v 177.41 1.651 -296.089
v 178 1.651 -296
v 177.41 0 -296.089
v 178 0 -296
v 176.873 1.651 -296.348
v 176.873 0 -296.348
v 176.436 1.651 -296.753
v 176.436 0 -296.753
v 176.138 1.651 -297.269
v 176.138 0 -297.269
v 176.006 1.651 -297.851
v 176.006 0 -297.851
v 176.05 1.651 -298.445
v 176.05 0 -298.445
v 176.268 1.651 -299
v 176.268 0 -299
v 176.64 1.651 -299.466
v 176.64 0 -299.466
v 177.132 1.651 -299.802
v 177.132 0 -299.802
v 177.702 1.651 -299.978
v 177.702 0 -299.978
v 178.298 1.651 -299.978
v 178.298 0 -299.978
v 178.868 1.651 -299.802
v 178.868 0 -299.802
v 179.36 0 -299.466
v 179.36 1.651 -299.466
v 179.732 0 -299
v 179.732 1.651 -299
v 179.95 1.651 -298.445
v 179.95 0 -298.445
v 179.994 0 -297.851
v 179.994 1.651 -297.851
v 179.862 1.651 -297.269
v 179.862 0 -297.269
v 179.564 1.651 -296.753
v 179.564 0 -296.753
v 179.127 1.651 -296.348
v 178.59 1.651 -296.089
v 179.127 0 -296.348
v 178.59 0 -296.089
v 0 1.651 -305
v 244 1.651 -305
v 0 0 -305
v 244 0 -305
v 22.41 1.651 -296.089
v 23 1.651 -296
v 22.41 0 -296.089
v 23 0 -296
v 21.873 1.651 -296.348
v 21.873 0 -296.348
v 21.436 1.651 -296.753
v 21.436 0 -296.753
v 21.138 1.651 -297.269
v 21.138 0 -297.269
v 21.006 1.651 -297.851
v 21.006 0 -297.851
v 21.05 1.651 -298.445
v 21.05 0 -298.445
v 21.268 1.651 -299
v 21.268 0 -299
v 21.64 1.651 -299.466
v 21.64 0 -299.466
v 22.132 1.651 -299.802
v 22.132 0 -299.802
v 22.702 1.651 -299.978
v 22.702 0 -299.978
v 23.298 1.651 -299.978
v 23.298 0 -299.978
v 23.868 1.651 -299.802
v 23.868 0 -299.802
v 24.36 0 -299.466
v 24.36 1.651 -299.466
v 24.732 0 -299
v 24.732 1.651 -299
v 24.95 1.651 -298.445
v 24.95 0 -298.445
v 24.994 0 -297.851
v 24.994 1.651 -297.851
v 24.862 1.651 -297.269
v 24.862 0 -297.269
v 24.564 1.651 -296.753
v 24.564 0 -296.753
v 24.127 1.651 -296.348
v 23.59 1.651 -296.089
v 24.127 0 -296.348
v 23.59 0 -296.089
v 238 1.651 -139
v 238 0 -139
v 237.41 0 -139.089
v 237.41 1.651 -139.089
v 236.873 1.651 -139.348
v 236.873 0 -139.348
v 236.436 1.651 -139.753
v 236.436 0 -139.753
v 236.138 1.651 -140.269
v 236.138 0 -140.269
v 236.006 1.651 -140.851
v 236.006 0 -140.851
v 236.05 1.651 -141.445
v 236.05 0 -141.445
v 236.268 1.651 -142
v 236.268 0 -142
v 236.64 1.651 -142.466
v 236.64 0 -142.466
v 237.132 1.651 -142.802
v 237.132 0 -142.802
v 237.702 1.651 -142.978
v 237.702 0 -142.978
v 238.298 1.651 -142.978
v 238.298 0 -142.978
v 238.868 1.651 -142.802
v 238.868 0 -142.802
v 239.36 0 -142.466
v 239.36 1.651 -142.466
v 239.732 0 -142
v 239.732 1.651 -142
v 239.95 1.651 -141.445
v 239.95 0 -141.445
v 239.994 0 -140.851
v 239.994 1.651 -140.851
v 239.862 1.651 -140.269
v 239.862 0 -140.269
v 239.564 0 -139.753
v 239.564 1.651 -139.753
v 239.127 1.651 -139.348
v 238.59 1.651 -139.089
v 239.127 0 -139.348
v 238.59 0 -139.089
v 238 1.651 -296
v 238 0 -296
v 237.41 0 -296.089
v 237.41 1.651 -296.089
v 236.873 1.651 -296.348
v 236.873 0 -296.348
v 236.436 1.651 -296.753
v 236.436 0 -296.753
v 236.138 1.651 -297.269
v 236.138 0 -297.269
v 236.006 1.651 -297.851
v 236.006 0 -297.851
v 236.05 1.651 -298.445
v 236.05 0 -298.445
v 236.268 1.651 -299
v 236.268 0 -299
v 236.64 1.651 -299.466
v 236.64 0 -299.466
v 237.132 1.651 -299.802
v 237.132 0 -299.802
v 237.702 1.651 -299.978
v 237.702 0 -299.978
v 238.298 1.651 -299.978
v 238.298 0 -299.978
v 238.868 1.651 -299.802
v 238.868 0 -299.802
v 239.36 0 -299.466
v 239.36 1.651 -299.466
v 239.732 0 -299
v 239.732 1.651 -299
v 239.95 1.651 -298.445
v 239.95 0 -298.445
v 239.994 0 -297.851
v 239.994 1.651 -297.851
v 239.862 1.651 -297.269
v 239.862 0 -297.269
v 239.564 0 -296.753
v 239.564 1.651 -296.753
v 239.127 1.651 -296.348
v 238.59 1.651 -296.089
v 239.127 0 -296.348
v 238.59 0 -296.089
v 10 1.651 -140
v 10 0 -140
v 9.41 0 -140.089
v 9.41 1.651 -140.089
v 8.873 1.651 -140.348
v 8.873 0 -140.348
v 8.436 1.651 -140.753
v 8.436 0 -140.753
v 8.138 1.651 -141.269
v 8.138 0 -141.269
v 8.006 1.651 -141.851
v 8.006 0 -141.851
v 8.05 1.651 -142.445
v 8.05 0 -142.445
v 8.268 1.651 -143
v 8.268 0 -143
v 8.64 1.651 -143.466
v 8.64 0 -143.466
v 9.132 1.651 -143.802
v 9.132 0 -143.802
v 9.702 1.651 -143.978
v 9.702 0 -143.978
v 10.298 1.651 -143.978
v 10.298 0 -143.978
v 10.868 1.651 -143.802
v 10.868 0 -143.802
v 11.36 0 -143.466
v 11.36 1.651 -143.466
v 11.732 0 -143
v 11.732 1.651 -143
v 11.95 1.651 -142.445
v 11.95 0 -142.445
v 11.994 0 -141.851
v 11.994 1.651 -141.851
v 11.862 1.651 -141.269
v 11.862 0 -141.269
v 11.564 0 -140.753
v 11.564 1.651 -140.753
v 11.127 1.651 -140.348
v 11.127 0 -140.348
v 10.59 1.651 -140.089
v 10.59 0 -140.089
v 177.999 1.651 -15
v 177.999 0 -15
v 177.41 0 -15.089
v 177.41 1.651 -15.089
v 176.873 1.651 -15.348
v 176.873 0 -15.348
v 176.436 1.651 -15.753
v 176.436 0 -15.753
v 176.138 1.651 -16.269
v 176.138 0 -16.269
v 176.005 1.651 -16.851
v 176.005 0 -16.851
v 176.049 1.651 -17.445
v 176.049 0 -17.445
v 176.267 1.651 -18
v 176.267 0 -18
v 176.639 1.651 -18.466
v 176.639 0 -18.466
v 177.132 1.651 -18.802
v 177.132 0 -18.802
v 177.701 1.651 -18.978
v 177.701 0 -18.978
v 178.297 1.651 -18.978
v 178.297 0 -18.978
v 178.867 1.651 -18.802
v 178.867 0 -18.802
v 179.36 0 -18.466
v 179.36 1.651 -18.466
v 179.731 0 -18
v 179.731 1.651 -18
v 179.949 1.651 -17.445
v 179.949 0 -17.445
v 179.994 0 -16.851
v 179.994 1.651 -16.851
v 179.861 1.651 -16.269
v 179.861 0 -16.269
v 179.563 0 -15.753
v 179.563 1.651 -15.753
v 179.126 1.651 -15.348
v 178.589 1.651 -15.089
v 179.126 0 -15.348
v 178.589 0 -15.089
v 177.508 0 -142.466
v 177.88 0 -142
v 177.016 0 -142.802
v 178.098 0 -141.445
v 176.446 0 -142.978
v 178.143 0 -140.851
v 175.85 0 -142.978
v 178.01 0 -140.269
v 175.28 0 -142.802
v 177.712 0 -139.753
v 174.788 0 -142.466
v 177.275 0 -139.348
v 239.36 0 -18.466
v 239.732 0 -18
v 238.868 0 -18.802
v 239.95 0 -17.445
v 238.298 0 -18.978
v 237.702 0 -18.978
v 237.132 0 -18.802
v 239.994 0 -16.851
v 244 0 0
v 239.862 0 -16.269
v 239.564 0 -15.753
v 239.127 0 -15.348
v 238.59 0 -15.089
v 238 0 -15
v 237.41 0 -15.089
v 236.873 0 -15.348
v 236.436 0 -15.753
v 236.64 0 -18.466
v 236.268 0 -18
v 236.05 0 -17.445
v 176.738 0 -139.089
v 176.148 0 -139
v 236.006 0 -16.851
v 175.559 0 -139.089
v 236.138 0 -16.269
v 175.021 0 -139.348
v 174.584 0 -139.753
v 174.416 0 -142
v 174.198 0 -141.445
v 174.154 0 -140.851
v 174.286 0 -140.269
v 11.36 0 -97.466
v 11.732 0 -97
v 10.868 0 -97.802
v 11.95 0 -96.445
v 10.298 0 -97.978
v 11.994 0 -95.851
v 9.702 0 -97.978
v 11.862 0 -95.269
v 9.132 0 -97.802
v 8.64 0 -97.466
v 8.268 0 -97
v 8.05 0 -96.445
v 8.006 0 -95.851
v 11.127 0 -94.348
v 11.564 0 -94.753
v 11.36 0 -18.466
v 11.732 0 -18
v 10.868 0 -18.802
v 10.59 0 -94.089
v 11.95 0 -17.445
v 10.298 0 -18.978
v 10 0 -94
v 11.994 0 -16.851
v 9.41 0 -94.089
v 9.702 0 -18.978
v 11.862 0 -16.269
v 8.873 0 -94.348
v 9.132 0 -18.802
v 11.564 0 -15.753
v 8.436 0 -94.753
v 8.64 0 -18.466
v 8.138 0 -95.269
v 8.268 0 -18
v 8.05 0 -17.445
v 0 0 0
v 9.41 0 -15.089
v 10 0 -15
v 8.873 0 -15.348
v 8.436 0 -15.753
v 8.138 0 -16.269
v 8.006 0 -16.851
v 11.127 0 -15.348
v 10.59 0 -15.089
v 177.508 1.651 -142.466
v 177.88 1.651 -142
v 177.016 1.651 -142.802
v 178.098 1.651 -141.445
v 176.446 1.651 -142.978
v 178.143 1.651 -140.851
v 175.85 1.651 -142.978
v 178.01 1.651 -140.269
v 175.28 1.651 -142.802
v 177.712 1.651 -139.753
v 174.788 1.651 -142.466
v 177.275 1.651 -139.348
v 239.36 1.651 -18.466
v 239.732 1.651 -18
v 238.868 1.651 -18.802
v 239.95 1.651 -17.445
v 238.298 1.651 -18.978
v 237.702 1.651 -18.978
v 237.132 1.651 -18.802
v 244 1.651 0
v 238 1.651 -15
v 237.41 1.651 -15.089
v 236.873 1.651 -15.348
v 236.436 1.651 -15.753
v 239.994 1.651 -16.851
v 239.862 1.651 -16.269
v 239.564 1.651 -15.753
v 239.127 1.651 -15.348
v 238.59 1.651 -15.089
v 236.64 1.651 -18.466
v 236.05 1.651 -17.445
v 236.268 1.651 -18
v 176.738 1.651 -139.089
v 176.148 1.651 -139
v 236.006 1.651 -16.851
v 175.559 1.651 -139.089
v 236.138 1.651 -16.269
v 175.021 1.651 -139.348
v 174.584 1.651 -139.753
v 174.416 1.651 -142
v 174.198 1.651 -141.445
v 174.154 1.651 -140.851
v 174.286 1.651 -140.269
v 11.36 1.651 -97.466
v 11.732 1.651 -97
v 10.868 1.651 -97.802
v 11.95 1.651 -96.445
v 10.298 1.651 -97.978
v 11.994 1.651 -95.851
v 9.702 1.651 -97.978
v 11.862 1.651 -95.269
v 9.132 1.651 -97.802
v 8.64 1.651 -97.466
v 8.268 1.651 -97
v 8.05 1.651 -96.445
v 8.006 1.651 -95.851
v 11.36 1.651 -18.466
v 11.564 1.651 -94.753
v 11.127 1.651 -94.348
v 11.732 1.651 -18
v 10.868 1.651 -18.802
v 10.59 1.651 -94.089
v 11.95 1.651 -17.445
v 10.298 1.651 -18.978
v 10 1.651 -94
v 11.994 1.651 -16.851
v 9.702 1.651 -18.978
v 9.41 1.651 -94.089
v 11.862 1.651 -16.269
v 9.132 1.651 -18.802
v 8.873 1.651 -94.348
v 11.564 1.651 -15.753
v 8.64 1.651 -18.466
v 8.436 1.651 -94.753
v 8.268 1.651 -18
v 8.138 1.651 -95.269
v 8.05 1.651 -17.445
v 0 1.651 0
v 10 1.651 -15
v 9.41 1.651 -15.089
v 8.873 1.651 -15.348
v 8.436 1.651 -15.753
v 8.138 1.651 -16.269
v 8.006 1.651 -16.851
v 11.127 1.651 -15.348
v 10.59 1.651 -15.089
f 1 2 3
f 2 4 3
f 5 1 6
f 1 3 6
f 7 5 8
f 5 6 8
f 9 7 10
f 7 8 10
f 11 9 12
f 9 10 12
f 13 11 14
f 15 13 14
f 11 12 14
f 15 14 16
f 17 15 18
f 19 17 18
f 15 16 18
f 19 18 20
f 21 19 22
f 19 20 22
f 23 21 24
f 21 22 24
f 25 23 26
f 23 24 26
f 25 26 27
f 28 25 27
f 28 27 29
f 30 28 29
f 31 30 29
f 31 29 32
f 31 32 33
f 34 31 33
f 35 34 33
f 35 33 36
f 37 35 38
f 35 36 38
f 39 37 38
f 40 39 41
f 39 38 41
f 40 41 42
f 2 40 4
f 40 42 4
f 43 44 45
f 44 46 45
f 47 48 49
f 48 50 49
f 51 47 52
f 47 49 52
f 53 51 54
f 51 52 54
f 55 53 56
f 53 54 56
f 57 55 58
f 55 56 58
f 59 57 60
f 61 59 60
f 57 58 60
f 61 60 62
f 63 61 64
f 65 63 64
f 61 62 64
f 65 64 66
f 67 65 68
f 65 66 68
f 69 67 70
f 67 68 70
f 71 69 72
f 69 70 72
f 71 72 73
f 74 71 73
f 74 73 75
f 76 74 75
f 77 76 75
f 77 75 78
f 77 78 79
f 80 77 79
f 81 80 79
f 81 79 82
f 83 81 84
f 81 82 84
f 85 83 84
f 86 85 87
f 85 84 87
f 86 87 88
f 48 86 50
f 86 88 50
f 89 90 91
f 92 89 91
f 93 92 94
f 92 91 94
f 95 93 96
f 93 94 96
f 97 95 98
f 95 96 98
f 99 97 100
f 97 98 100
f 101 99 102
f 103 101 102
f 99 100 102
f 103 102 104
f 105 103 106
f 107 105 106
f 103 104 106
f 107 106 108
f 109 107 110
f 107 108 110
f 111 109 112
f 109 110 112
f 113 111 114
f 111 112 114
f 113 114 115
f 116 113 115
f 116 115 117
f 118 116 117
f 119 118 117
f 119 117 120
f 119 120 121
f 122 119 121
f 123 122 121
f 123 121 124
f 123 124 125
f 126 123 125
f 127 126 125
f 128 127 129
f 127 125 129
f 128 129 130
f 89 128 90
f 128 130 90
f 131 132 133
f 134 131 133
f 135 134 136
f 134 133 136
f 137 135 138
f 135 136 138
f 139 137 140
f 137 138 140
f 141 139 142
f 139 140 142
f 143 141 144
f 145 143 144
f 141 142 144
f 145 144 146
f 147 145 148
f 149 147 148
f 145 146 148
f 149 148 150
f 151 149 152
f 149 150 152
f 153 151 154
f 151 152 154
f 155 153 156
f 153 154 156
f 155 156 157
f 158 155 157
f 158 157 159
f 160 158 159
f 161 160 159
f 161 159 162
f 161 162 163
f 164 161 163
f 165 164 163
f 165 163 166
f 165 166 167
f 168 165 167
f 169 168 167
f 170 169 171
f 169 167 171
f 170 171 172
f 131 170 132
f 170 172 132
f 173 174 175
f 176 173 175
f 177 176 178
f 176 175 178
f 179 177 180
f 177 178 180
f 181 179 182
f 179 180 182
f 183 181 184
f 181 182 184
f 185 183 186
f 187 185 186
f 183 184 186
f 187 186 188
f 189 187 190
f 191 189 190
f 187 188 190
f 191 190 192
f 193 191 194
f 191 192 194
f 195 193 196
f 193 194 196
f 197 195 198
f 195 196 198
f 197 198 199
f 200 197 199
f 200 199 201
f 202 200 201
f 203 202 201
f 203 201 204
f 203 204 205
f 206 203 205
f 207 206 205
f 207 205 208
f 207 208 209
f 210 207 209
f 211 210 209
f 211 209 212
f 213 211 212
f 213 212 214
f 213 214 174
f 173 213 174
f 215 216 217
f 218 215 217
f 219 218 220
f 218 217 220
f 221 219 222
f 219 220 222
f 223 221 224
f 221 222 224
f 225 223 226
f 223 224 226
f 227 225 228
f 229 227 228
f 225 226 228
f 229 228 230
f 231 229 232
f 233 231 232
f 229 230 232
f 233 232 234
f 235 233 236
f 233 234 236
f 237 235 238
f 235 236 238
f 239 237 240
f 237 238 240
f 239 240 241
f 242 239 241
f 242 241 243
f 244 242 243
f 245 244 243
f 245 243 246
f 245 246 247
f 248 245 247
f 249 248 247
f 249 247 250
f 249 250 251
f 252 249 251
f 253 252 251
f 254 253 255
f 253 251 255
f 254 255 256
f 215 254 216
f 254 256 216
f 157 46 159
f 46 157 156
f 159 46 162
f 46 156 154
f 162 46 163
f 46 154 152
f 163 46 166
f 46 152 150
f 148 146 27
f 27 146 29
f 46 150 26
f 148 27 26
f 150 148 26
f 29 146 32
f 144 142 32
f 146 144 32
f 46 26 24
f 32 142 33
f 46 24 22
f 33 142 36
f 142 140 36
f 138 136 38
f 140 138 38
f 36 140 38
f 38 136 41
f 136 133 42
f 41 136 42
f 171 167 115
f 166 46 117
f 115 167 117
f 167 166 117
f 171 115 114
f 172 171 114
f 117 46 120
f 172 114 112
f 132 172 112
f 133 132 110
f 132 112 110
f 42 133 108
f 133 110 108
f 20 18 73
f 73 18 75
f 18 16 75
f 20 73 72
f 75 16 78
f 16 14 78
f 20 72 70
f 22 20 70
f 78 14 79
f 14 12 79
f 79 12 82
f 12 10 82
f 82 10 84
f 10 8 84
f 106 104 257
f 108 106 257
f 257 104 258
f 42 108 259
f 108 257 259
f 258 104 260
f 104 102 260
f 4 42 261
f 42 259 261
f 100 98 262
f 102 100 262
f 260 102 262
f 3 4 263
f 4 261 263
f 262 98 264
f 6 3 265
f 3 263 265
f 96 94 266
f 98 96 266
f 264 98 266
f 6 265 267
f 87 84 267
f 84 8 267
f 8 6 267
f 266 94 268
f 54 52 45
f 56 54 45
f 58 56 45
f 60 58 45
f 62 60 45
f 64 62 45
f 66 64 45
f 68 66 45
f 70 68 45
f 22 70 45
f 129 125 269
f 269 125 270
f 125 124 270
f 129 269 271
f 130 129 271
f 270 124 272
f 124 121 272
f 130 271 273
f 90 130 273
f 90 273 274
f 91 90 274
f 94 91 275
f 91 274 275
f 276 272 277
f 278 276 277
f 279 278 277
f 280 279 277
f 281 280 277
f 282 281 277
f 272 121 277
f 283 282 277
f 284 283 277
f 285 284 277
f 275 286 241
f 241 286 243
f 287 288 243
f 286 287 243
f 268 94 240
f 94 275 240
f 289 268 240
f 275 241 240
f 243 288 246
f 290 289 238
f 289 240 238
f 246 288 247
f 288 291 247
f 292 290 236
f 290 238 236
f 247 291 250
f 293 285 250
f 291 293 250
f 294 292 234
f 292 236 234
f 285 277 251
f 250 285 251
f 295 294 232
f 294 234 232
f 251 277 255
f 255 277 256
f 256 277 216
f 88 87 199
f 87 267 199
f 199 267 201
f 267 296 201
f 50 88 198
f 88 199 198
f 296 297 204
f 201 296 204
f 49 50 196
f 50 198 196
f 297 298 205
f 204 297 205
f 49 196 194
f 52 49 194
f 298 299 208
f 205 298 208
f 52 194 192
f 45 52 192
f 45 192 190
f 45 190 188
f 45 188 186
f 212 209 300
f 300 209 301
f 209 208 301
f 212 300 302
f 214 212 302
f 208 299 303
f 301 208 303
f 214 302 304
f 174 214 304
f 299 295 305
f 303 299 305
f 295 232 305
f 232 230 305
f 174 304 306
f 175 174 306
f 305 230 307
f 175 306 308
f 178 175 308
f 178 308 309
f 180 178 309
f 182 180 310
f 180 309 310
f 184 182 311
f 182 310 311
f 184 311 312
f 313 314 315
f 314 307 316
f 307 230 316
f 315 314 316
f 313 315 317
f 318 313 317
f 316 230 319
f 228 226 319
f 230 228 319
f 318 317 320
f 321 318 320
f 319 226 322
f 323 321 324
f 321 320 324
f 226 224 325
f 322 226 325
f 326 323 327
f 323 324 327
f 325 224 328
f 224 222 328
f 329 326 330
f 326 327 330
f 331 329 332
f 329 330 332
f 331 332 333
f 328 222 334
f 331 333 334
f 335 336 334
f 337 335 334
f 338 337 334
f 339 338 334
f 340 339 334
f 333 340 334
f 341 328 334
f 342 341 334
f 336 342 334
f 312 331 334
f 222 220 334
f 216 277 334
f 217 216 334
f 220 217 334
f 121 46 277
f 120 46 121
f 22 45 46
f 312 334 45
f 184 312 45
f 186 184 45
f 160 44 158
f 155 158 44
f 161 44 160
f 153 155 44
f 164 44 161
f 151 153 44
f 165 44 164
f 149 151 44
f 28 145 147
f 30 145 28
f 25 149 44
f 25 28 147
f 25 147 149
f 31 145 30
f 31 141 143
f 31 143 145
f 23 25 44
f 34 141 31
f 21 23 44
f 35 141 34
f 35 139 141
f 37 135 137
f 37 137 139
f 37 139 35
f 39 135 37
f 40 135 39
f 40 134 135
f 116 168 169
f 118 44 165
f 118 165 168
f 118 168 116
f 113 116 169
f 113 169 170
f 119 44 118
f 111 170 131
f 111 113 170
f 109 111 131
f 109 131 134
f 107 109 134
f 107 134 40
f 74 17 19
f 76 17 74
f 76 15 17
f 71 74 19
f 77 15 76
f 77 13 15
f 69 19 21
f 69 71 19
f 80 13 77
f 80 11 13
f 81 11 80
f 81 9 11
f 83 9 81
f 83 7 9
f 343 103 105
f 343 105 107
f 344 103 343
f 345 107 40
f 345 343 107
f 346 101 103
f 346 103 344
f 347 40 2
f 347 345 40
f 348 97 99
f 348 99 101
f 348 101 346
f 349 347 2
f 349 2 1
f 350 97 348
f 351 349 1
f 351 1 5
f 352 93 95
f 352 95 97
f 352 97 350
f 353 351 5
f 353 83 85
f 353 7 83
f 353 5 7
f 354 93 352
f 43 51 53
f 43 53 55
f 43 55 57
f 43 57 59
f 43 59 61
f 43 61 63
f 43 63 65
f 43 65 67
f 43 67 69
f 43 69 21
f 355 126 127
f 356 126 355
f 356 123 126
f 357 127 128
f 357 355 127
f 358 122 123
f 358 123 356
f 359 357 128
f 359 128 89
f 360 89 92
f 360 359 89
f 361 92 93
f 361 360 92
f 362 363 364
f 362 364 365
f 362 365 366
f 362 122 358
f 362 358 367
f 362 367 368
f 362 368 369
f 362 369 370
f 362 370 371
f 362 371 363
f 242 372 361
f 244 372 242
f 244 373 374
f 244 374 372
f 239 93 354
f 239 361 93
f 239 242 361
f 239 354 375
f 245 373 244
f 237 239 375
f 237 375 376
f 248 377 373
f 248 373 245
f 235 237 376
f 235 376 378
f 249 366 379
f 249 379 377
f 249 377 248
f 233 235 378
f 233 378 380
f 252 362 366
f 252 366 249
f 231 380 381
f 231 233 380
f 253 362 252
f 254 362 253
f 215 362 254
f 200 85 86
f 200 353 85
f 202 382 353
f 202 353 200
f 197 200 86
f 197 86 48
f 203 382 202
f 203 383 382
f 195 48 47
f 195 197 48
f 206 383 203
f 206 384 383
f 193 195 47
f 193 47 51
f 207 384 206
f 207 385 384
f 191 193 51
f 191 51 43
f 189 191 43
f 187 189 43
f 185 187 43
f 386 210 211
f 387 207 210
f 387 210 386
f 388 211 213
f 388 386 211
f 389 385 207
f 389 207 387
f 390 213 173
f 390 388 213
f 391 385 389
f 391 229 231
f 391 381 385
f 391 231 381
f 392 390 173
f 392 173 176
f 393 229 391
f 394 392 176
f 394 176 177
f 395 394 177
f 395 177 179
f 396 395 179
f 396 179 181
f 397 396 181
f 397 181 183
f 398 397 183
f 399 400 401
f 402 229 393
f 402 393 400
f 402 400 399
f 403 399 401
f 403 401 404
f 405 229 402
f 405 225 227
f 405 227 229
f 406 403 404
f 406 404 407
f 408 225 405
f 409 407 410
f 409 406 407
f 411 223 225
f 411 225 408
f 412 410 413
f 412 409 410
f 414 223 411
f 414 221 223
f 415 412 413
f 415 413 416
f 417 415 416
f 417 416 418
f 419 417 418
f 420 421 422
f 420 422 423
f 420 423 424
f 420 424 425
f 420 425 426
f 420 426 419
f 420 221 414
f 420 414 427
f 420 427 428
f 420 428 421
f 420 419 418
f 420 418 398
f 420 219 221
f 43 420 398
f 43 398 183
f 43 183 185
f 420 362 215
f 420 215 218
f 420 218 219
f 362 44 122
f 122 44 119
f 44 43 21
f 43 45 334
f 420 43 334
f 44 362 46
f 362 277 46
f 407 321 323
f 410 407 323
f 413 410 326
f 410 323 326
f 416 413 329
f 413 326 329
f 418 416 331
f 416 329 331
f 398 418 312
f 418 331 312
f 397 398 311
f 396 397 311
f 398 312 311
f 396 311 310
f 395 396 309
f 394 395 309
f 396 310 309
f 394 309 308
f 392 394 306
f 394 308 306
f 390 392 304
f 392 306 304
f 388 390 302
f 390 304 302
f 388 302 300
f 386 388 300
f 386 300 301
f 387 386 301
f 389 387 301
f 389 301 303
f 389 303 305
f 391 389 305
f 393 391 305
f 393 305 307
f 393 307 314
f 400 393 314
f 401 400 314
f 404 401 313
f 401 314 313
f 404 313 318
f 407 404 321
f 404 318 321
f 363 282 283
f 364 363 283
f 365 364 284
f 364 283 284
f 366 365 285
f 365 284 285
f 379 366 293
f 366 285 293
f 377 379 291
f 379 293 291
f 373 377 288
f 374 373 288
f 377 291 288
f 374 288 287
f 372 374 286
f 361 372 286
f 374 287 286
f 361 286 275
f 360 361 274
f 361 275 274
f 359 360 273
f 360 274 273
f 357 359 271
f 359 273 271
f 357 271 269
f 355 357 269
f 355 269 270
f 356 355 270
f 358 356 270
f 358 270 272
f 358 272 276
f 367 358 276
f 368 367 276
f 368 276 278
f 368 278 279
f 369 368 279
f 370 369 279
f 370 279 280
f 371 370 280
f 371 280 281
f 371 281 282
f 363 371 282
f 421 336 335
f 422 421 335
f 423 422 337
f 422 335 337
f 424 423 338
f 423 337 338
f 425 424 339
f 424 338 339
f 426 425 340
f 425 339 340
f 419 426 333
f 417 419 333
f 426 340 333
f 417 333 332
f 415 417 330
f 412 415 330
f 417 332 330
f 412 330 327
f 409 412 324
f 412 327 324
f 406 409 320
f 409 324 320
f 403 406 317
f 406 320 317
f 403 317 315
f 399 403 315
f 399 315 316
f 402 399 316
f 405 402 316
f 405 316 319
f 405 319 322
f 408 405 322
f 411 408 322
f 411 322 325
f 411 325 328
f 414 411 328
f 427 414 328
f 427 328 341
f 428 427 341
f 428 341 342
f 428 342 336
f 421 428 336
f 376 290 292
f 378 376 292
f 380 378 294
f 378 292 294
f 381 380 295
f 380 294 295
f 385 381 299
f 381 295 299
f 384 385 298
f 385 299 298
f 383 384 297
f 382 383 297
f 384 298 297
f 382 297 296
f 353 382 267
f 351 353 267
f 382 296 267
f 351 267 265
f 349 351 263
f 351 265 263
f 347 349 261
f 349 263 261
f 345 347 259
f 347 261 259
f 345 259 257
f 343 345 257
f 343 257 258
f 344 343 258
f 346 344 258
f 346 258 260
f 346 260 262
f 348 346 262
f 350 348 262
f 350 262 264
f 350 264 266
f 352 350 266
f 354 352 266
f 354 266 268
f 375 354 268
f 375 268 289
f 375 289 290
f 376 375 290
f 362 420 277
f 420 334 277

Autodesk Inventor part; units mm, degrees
ref_plane "YZ Plane" through (0, 0, 0) normal (1, 0, 0) x (0, 1, 0)
ref_plane "XZ Plane" through (0, 0, 0) normal (0, 1, 0) x (-1, 0, 0)
ref_plane "XY Plane" through (0, 0, 0) normal (0, 0, 1) x (1, 0, 0)
sketch "Sketch1" plane through (0, 0, 0) normal (0, 1, 0) x (-1, 0, 0)
  line L0 (0, 0) -> (-244, 0)
  line L1 (-244, 0) -> (-244, -305)
  line L2 (-244, -305) -> (0, -305)
  line L3 (0, -305) -> (0, 0)
  dimension "d0" = 244
  dimension "d1" = 305
extrude "Extrusion1" add sketch "Sketch1" along normal blind 1.651
sketch "Sketch2" plane through (0, 1.651, 0) normal (0, 1, 0) x (1, 0, 0)
  line L0 (0, 305) -> (0, 0) projected
  line L1 (0, 0) -> (244, 0) projected
  line L2 (244, 0) -> (244, 305) projected
  point P0 (10, 17)
  point P1 (10, 96)
  point P2 (10, 142)
  point P3 (238, 17)
  point P4 (177.9993, 17)
  point P5 (176.1481, 141)
  point P6 (178, 298)
  point P7 (23, 298)
  point P8 (238, 141)
  point P9 (238, 298)
  dimension "d4" = 10
  dimension "d5" = 17
  dimension "d6" = 79
  dimension "d8" = 46
  dimension "d11" = 6
  dimension "d14" = 17
  dimension "d16" = 155
  dimension "d17" = 23
  dimension "d18" = 124
  dimension "d19" = 157
hole "Hole1" at (10, 1.651, -17) at (10, 1.651, -96) at (10, 1.651, -142) at (238, 1.651, -17) at (177.9993, 1.651, -17) at (176.1481, 1.651, -141) at (178, 1.651, -298) at (23, 1.651, -298) at (238, 1.651, -141) at (238, 1.651, -298) direction (0, -1, 0) diameter 4 end through all
properties part number "atxboard"
